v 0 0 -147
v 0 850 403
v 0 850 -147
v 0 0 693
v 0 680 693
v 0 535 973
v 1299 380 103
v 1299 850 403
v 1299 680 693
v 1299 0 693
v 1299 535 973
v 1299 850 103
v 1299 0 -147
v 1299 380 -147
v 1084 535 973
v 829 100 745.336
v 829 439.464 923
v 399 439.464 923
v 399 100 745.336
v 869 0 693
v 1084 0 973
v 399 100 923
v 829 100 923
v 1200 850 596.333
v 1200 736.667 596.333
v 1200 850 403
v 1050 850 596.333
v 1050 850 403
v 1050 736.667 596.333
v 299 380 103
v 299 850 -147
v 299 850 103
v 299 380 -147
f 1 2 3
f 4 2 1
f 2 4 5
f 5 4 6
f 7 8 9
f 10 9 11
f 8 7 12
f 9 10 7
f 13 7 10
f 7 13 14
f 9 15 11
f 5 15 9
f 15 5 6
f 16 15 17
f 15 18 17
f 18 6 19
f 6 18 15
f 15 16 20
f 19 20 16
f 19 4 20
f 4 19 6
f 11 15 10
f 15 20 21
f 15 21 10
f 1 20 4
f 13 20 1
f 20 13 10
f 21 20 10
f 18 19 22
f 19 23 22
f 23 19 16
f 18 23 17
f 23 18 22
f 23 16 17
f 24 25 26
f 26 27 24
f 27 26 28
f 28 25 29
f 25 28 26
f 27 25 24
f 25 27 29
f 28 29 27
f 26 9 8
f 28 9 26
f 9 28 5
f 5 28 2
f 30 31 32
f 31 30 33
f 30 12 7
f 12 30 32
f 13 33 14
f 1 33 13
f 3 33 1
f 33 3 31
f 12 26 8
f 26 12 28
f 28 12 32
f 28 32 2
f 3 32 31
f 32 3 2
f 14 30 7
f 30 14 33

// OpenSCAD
// file: dormer/dormer.scad
// Massstab 1 entspricht einem cm

module coppedDormer(width, height, depth) {
	polyhedron(
		points = [
			[0, 0, 0], 
			[width/2, depth, height], 
			[width/2, 0, height], 
			[width, 0, 0],], 
		triangles = [
			[0,1,2], 
			[0,2,3],
			[3,2,1],
			[3,1,0],]);
}

module plainDormer(width, height, depth) {
	polyhedron(
		points = [
			[0, 0, 0], 
			[0, depth, height],
			[0, 0, height], 
			[width, 0, 0], 
			[width, depth, height],
			[width, 0, height], ], 
		triangles = [
			[0, 1, 2], 
			[1, 4, 2],
			[4, 5, 2],
			[3, 5, 4],
			[2, 5, 3],
			[2, 3, 0],
			[1, 0, 3],
			[1, 3, 4],]);
}

module houseDormer(width, height, depth) {
   ratioPlain = 2/3;
   ratioCopped = 1 - ratioPlain;

	union()
	translate([0, 0, height * ratioPlain]) {
		polyhedron(
			points = [
				[0, 0, 0], 
				[0, depth * ratioPlain, 0], 
				[width/2, depth, height * ratioCopped], 
				[width/2, 0, height * ratioCopped], 
				[width, 0, 0], 
				[width, depth * ratioPlain, 0],], 
			triangles = [
				[0, 1, 3], 
				[1, 2, 3],
				[0, 3, 4],
				[5, 4, 3],
				[5, 3, 2],
				[5, 2, 1],]);
	}
	plainDormer(width, height * ratioPlain, depth * ratioPlain);
}

translate ([-500,0,0])
		houseDormer(400, 250, 400);
translate ([0,0,0])
		coppedDormer(400, 250, 400);
translate ([399, 100, 50])
		plainDormer(400, 250, 
			400);
// main file
// Massstab 1 entspricht einem cm
use <dormer/dormer.scad>

module keller() {
   neukellerbreite = 30 + 250 + 19;
   color([ 100/255, 100/255, 0/255 ])
	union() {
		cube(size = [neukellerbreite,850,250]);
		translate([neukellerbreite, 0, 0]) {
			cube(size = [1000,380,250]);
		}
	}
}

module erdgeschoss() {
   color([ 200/255, 200/255, 0/255 ])
	cube(size = [1299,850,300]);
}

module obergeschoss() {
	dachanfang = 430 + 250;
	geschosshoehe=290;
	haustiefe = 850;
	union() { 
		cube(size = [1299,dachanfang,geschosshoehe]);
		polyhedron ( points = [
				[0, dachanfang, 0], 
				[0, haustiefe, 0], 
				[0, dachanfang, geschosshoehe], 
				[1299, dachanfang, 0], 
				[1299, haustiefe, 0], 
				[1299, dachanfang, geschosshoehe]], 
				triangles = [
					[0,1,2], 
					[5,4,3],
					[4,1,0],
					[0,3,4],
					[5,3,0],
					[0,2,5],
					[4,2,1],
					[2,4,5],]);
		translate([1200,haustiefe,0])
		rotate([0,0,180])
		houseDormer(150, geschosshoehe, haustiefe - dachanfang);
	}
}

module dachgeschoss () {
	dachanfang = 430 + 250;
	giebeltiefe = 535;
	giebelhoehe = 280;
	gaubenbreite = 430;
	color([ 100/255, 000/255, 0/255 ])
	union() {
	polyhedron ( points = [
				[0, dachanfang, 0], 
				[0, giebeltiefe, giebelhoehe], 
				[0, 0, 0], 
				[1299, dachanfang, 0], 
				[1299, giebeltiefe, giebelhoehe], 
				[1299, 0, 0]], 
				triangles = [
					[0,1,2], 
					[5,4,3],
					[4,1,0],
					[0,3,4],
					[5,3,0],
					[0,2,5],
					[4,2,1],
					[2,4,5],]);
	translate ([1299-gaubenbreite,0,0])
		coppedDormer(gaubenbreite, giebelhoehe, giebeltiefe);
	translate ([399, 100, 50])
		plainDormer(gaubenbreite, giebelhoehe - 100, 
			giebeltiefe -100);

	}
}

module haus () {
   bodenniveau = 103;
   union () {
		translate([0,0,bodenniveau+300+290]) {
			dachgeschoss();
		}
       translate([0,0,bodenniveau+300]) {
			obergeschoss();
		}
		translate([0,0,bodenniveau]) {
			erdgeschoss();
		}
		translate([0,0,bodenniveau-250]) {
			keller();
		}
	}
}


haus();
